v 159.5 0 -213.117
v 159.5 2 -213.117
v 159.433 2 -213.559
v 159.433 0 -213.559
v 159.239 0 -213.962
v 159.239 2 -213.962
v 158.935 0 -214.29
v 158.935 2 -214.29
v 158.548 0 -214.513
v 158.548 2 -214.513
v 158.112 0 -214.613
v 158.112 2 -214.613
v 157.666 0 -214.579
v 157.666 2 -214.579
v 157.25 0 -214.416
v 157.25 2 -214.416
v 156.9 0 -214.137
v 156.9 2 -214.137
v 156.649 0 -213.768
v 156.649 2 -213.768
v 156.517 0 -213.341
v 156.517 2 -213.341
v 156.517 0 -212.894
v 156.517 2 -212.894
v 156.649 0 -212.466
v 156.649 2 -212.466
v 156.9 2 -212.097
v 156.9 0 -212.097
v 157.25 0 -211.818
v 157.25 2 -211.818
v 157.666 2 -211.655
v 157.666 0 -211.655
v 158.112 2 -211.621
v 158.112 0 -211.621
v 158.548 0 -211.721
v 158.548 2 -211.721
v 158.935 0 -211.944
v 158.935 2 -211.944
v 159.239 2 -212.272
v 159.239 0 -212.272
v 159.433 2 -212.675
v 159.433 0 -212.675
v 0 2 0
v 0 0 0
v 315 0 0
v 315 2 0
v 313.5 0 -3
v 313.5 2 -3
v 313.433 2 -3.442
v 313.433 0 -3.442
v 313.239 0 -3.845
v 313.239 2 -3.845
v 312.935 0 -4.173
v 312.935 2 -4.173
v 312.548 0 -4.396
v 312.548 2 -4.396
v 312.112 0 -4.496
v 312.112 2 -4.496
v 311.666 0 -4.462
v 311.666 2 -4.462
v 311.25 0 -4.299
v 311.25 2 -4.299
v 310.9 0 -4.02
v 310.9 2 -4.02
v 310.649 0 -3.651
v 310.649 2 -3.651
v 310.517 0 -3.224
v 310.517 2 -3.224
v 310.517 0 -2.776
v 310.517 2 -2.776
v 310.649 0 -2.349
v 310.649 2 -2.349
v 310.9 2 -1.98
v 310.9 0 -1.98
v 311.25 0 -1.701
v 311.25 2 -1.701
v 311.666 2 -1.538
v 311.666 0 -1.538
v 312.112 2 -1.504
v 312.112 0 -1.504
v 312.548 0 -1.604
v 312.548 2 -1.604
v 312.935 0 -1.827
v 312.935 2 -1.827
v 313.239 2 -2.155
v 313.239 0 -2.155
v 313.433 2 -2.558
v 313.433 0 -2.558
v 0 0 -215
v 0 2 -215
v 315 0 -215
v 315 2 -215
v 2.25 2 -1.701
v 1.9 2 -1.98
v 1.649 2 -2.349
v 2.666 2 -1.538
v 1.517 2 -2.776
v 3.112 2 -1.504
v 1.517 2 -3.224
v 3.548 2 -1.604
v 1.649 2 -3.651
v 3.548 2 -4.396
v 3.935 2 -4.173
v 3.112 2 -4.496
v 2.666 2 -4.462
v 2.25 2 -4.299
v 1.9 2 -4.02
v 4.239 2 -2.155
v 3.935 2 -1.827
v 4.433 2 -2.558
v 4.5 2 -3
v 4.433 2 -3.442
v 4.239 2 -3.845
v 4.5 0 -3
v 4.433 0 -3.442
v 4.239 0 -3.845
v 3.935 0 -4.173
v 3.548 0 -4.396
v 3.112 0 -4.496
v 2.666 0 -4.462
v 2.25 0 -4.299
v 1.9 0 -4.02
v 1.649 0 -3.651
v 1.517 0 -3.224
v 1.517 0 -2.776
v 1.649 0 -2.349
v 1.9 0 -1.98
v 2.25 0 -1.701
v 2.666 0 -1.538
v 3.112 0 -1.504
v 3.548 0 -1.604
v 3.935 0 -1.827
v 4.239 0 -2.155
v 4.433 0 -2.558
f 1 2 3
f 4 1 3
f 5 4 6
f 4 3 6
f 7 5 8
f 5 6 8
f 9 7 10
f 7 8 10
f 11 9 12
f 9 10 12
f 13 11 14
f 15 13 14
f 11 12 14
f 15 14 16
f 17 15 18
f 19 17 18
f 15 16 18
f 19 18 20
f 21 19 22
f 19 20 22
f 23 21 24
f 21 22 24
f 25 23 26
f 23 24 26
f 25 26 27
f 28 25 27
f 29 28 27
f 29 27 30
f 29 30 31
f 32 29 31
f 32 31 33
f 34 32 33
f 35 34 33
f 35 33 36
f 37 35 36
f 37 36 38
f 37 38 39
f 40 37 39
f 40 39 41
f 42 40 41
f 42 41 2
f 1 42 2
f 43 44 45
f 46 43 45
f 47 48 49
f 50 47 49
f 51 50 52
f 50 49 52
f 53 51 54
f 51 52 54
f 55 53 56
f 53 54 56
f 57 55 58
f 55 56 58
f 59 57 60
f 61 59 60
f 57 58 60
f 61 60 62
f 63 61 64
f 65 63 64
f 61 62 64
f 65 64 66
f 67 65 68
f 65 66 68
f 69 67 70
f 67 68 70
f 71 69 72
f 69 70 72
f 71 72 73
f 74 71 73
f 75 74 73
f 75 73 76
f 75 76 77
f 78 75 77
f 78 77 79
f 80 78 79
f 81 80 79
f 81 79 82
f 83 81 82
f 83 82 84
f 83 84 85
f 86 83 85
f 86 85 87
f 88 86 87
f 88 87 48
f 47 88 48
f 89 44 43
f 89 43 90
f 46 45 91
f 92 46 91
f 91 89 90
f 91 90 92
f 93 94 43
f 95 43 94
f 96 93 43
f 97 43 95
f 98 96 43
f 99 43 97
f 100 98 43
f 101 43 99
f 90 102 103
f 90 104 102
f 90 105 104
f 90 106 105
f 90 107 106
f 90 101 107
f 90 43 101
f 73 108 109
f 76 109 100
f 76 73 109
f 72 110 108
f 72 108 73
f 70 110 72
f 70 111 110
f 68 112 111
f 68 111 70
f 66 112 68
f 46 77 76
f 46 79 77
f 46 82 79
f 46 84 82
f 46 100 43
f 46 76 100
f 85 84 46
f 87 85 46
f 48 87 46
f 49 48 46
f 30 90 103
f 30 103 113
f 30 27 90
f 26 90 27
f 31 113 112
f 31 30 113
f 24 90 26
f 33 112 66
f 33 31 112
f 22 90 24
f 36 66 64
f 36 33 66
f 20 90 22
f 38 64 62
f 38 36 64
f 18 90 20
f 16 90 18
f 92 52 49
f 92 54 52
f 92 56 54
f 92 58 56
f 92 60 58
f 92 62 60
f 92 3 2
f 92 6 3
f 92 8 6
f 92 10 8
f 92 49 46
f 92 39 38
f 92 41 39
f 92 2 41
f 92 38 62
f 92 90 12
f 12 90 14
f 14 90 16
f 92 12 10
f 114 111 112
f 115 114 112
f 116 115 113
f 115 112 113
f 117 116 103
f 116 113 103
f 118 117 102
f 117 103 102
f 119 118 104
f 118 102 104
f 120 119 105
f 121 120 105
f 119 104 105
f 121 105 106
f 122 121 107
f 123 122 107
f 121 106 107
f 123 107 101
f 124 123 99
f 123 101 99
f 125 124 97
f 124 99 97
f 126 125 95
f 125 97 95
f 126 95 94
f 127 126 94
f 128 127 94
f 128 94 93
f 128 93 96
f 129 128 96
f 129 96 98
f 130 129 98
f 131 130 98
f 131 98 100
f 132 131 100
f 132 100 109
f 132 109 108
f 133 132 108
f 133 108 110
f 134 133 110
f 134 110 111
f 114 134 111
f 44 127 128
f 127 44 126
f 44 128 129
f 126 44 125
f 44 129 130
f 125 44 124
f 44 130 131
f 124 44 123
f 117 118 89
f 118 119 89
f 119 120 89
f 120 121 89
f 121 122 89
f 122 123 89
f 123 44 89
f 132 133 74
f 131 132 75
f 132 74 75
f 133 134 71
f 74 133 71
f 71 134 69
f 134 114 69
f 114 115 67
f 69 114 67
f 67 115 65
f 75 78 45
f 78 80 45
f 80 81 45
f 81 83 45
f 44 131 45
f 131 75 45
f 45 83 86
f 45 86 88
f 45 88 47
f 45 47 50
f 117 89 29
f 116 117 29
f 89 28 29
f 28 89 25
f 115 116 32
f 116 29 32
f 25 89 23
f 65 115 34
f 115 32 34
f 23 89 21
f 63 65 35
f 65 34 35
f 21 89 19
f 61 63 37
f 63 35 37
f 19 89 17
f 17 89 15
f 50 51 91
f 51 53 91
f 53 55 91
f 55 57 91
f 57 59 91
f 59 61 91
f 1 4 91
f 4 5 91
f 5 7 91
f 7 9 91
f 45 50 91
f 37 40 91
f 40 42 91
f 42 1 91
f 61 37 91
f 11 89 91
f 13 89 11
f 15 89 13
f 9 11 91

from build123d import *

# Parameters (mm, degrees)
SKETCH1_W           = 315
SKETCH1_H           = 215
BOSS_EXTRUDE1_DEPTH = 2
SKETCH2_R           = 1.5
CUT_EXTRUDE1_DEPTH  = 47
SKETCH3_R           = 1.5
CUT_EXTRUDE2_DEPTH  = 47


with BuildPart() as part:
    # Sketch1 → Boss-Extrude1 (new body)
    with BuildSketch(Plane(origin=(0, 0, 0), x_dir=(1, 0, 0), z_dir=(0, 1, 0))):
        with Locations((157.5, 107.5)):
            Rectangle(SKETCH1_W, SKETCH1_H)
    extrude(amount=BOSS_EXTRUDE1_DEPTH)

    # Sketch2 → Cut-Extrude1 (cut)
    with BuildSketch(Plane(origin=(0, 2, 0), x_dir=(1, 0, 0), z_dir=(0, 1, 0))):
        with Locations((3, 3)):
            Circle(SKETCH2_R)
        with Locations((312, 3)):
            Circle(SKETCH2_R)
    extrude(amount=-CUT_EXTRUDE1_DEPTH, mode=Mode.SUBTRACT)

    # Sketch3 → Cut-Extrude2 (cut)
    with BuildSketch(Plane(origin=(0, 2, 0), x_dir=(1, 0, 0), z_dir=(0, 1, 0))):
        with Locations((158, 213.117089456)):
            Circle(SKETCH3_R)
    extrude(amount=-CUT_EXTRUDE2_DEPTH, mode=Mode.SUBTRACT)


solid = part.part
